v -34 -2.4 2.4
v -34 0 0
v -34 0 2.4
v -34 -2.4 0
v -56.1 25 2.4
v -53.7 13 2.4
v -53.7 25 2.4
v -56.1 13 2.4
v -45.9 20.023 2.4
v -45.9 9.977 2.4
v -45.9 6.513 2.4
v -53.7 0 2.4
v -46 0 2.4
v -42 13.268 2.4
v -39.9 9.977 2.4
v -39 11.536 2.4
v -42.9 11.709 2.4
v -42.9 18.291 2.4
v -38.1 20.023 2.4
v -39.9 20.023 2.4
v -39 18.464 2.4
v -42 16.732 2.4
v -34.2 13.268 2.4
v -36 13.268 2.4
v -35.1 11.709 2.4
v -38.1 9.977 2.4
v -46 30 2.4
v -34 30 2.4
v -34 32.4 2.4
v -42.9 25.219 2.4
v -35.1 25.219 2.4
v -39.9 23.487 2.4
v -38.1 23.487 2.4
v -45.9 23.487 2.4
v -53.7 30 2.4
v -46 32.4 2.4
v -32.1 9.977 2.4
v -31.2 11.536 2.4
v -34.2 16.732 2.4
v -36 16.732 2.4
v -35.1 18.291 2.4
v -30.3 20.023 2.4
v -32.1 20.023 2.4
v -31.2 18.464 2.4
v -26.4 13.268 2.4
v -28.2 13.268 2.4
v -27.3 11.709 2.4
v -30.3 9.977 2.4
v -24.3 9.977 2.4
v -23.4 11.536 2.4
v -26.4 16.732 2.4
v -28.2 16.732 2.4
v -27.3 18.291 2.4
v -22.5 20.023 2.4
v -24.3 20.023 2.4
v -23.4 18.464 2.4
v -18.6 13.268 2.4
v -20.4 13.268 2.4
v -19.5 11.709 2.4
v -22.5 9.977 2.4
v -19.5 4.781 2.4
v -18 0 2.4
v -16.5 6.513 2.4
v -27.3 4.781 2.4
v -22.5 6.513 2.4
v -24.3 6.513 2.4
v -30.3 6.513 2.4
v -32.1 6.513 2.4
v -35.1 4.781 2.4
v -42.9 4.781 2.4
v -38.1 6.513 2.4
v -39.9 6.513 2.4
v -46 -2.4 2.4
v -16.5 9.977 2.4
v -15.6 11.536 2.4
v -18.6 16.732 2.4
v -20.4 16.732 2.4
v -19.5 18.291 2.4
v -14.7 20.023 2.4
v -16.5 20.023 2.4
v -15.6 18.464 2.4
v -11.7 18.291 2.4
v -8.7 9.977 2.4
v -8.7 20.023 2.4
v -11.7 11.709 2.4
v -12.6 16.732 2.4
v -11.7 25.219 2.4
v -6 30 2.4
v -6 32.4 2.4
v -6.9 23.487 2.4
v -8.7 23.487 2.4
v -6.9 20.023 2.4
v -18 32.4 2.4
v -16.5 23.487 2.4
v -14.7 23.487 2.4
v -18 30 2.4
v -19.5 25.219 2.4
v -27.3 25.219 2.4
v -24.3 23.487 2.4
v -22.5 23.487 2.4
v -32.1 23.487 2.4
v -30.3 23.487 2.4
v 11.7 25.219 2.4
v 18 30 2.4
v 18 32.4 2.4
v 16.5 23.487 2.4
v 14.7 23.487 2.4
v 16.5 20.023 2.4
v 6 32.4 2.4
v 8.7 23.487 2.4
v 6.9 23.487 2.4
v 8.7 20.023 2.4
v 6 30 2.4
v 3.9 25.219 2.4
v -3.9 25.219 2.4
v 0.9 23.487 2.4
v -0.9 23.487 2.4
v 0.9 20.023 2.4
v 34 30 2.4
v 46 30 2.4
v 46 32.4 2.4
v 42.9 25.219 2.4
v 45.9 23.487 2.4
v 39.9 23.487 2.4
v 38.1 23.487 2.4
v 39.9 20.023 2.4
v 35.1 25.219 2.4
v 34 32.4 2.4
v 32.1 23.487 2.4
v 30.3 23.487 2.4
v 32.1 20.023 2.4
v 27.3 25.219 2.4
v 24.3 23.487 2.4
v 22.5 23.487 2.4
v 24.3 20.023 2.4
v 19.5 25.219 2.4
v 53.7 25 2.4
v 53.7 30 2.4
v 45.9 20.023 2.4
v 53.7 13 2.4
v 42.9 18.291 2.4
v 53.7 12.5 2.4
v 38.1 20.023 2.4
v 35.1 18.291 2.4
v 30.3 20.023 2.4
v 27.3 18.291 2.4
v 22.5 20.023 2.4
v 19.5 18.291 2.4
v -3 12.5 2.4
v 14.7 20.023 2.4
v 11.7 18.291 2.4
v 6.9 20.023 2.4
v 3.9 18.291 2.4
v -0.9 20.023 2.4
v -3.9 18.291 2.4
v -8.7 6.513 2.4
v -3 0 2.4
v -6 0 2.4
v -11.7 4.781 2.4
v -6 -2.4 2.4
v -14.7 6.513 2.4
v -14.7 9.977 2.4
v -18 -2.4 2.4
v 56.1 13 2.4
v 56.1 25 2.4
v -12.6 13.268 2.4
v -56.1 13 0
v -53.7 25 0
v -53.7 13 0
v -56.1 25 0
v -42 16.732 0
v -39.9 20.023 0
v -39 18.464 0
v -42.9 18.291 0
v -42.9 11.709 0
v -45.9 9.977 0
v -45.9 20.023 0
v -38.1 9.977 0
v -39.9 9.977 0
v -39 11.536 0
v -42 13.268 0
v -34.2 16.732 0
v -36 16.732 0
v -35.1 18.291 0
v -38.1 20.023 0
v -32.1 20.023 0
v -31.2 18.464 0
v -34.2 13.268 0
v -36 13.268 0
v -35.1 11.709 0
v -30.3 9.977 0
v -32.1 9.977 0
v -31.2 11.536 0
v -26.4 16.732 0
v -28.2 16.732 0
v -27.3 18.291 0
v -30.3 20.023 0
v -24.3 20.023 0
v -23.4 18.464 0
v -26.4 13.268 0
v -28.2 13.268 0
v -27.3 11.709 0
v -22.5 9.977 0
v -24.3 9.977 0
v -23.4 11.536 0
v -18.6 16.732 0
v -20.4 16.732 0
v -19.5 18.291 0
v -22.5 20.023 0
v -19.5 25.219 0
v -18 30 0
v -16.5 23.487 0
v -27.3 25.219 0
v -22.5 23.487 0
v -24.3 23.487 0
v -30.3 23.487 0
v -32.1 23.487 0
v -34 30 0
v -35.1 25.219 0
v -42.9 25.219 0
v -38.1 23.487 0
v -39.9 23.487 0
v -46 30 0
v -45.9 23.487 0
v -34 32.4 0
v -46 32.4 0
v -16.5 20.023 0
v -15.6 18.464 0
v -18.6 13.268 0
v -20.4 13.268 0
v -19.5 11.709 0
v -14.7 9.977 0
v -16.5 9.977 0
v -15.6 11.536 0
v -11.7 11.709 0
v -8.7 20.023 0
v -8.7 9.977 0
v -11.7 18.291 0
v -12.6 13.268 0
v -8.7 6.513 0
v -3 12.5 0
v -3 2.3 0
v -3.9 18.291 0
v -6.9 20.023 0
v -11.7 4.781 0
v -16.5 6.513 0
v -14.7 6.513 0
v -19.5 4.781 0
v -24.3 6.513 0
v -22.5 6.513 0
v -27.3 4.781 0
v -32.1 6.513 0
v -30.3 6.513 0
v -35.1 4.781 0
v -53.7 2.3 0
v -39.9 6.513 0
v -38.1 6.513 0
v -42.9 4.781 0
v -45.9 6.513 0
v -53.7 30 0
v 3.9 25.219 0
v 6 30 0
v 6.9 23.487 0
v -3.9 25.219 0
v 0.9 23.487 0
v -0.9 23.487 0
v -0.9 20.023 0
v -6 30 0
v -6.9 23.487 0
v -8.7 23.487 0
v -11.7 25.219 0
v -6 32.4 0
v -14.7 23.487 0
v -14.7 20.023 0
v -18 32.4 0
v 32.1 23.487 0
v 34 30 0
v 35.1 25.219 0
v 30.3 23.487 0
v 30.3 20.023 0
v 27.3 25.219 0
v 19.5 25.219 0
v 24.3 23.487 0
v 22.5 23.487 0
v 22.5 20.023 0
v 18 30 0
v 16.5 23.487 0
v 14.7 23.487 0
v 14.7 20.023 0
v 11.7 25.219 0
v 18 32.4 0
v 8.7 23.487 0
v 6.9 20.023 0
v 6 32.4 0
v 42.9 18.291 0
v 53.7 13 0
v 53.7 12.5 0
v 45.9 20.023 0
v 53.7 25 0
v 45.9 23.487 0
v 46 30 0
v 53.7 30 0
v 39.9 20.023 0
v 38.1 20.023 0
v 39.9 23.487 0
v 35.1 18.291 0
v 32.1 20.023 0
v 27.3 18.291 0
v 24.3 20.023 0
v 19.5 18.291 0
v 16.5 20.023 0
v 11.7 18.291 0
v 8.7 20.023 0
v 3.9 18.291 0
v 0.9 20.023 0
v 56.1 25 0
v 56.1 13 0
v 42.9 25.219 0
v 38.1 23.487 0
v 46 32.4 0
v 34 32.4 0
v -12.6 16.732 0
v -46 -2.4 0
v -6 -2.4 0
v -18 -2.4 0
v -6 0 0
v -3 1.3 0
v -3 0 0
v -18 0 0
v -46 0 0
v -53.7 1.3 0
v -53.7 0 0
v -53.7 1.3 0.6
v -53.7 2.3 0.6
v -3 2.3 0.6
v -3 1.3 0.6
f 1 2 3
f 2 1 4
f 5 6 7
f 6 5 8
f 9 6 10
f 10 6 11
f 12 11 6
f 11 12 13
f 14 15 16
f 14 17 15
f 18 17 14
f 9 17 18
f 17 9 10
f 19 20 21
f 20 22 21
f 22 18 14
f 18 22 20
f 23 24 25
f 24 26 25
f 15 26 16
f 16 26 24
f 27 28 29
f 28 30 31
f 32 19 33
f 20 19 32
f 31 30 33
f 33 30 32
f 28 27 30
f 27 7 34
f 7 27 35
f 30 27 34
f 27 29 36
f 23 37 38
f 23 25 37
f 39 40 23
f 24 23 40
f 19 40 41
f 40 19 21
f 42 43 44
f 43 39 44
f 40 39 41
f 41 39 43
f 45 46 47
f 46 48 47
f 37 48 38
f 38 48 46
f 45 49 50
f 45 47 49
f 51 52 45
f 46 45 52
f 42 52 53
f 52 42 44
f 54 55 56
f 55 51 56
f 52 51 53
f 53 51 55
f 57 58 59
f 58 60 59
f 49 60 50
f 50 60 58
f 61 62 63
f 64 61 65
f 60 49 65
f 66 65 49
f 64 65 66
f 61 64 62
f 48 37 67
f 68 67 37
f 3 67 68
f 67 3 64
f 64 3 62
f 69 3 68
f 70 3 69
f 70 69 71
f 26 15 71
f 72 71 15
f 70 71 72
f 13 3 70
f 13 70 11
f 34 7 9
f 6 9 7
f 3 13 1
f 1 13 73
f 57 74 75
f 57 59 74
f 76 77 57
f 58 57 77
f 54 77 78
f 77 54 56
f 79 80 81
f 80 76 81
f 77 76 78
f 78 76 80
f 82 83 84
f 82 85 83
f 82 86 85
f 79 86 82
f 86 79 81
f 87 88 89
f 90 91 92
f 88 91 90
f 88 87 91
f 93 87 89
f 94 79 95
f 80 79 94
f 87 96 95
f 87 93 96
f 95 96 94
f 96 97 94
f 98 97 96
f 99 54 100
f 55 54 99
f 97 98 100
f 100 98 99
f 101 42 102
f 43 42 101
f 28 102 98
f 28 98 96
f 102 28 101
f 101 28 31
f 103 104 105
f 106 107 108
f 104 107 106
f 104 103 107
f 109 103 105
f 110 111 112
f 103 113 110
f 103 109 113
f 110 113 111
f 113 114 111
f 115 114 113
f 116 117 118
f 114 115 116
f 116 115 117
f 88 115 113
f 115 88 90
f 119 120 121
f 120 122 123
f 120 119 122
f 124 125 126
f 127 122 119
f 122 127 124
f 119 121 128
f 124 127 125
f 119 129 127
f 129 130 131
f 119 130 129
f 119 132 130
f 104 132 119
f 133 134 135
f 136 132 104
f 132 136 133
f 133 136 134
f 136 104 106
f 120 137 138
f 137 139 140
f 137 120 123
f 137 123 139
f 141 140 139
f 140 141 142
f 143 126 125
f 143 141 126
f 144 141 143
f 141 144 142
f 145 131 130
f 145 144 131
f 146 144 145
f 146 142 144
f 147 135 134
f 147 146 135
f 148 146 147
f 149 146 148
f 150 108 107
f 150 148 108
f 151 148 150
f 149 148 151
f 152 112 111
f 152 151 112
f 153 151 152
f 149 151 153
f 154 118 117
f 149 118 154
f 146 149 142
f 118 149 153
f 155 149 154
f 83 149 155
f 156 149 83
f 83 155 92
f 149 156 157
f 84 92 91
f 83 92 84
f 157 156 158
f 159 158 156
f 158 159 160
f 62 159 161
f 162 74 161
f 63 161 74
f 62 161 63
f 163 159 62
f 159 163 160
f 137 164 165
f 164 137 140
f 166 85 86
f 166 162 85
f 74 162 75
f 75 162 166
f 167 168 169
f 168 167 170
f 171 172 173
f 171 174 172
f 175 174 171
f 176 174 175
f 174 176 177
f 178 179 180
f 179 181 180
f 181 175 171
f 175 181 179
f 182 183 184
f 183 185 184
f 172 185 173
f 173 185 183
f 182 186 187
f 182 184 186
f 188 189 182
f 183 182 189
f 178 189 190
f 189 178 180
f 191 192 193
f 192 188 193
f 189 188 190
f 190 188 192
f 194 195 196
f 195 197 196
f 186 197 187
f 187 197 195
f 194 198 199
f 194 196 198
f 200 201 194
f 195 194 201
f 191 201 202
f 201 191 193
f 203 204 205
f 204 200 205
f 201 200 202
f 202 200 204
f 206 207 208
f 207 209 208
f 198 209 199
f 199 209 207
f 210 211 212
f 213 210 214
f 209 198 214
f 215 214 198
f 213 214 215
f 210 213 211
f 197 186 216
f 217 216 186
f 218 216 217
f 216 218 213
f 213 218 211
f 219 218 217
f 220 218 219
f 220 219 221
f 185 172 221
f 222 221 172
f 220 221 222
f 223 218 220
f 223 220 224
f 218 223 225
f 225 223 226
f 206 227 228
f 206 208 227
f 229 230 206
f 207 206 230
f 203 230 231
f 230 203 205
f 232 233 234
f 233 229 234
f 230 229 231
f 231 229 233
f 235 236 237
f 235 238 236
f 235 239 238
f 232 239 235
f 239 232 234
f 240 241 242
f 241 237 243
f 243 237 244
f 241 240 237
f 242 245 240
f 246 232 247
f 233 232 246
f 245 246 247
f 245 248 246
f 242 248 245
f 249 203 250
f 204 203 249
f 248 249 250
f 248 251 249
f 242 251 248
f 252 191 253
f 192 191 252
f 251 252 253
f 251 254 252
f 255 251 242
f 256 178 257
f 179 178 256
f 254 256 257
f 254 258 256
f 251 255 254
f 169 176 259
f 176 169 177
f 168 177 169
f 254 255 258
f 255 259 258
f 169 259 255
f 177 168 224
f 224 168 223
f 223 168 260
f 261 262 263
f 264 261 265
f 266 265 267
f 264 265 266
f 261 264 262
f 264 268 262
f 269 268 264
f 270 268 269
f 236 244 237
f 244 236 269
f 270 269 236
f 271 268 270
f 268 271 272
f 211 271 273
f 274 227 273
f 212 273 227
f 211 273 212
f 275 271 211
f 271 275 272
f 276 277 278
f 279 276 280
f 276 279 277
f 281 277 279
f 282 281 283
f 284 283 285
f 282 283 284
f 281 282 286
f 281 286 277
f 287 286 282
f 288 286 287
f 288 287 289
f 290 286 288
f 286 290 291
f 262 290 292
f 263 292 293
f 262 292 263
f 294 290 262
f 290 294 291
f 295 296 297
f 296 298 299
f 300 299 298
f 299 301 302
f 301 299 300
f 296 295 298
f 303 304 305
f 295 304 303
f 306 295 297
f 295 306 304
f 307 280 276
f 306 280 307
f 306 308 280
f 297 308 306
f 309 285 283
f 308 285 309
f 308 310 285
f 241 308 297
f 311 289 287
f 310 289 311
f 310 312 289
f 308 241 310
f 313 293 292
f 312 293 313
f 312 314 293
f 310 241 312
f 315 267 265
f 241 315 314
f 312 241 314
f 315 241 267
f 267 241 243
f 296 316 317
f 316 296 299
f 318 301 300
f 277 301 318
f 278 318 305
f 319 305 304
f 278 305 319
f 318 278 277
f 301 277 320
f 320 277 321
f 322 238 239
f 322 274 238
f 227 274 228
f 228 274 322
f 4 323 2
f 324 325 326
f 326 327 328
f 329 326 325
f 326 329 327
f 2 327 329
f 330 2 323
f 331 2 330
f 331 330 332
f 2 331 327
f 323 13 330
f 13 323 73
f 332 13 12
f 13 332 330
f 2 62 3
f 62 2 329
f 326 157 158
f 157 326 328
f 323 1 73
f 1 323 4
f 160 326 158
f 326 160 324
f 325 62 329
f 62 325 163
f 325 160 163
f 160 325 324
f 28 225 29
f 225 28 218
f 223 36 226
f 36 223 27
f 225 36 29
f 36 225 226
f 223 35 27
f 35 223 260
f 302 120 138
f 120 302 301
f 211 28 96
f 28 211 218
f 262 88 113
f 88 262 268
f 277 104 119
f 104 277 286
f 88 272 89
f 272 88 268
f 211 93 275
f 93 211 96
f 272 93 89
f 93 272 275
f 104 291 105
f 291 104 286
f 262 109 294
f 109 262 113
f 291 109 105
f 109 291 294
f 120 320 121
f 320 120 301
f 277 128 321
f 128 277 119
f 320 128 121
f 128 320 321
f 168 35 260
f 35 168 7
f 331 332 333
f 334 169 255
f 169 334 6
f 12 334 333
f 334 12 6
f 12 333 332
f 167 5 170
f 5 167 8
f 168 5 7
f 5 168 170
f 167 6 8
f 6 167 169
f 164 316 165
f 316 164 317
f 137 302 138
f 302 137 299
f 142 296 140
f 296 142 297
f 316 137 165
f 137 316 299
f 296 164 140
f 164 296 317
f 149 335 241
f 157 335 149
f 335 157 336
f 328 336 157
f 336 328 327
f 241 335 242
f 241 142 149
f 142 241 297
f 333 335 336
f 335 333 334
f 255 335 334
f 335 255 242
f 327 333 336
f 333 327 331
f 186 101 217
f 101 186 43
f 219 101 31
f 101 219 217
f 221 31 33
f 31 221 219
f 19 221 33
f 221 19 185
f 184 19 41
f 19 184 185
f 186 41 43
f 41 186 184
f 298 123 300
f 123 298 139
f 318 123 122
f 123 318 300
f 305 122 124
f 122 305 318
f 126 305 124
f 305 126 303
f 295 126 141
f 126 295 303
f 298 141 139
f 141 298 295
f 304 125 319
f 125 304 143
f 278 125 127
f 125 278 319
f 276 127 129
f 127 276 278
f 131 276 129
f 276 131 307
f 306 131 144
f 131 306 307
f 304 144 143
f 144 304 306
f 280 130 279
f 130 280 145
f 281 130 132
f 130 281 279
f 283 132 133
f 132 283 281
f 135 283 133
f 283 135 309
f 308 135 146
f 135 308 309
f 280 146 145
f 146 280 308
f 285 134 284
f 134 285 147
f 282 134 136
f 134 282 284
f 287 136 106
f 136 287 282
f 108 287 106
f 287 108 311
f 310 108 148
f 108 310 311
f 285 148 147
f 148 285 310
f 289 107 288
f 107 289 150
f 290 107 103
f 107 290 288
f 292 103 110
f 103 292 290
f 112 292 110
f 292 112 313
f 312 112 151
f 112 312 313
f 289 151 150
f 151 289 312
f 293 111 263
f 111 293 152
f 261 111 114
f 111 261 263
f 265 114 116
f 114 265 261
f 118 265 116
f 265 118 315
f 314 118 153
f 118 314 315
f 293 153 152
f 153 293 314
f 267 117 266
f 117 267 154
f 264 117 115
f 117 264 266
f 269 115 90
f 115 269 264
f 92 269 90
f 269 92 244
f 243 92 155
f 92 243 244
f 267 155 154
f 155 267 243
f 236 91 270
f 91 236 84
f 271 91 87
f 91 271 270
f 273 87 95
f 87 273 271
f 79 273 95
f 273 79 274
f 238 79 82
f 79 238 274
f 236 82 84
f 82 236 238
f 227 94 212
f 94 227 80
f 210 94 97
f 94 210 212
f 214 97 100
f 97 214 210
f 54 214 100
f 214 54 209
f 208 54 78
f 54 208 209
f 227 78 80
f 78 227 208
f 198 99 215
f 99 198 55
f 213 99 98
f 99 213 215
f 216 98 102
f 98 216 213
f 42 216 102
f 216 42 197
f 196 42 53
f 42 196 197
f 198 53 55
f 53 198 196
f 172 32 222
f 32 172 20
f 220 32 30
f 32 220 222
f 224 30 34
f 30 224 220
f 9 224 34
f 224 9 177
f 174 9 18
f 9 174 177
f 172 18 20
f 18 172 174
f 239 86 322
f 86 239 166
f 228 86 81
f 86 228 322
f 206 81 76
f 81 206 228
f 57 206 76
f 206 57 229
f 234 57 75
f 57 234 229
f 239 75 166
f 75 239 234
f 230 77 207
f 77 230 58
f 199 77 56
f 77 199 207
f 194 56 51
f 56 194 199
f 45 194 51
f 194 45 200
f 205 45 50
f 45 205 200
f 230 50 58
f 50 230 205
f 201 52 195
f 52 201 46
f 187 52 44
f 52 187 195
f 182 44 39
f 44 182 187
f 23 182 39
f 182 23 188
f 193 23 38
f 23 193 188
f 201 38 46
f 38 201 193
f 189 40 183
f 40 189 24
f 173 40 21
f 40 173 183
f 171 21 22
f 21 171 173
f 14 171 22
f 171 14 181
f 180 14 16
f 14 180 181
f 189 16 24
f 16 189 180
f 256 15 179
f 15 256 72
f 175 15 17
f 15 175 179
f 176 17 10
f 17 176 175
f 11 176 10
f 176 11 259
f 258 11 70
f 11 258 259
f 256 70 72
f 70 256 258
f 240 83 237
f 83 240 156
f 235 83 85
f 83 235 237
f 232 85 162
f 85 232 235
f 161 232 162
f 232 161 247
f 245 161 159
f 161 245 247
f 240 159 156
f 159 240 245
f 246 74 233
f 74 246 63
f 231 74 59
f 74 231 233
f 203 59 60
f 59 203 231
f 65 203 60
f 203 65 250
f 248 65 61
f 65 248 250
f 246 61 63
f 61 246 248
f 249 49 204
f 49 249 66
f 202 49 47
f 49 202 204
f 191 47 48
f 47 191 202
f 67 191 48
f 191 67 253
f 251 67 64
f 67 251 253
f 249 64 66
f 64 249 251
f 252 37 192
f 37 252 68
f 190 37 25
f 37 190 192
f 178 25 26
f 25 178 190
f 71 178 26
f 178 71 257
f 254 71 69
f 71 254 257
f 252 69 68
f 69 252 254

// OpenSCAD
// file: lib.scad
// Helpers shared by the parts.
include <params.scad>

// box from corner a to corner b
module box(a, b) {
    translate([min(a[0],b[0]), min(a[1],b[1]), min(a[2],b[2])])
        cube([abs(b[0]-a[0]), abs(b[1]-a[1]), abs(b[2]-a[2])]);
}

// ---- pins ---------------------------------------------------------------
// Pin along +z from z=0: cylinder + conical tip.
module pin() {
    cylinder(d = pin_d, h = pin_len - pin_tip + 0.01);
    translate([0, 0, pin_len - pin_tip])
        cylinder(d1 = pin_d, d2 = 1.0, h = pin_tip);
}

// ---- hex bump --------------------------------------------------------
// Hexagonal bump standing on the XY plane, slight taper for a lead-in.
// Same orientation as the honeycomb cells (rotate(30)), so a plate bump
// drops straight into a cell of the plate above.
module hex_bump(af) {
    r = af / sqrt(3);
    translate([0, 0, -0.3])
        linear_extrude(height = bump_h + 0.3, scale = 0.93) rotate(30) circle(r = r, $fn = 6);
}
module hex_hole(af, t) {
    r = af / sqrt(3);
    translate([0, 0, -1]) linear_extrude(height = t + 2) rotate(30) circle(r = r, $fn = 6);
}
// keep-out rectangle for a hex bump (or hole) in a centred 2D field
function bump_keep(x, y, cx, cy, af = wall_bump_af) = let(r = af / sqrt(3) + b_keep_margin)
    [x - r - cx, y - r - cy, x + r - cx, y + r - cy];

// ---- honeycomb -----------------------------------------------------------
// 2D field of hexagonal holes filling a `size` = [w, h] rectangle centred on
// the origin. Only whole cells are emitted, so the border stays a clean web.
// `keep` lists [x0, y0, x1, y1] rectangles (same frame) no cell may touch.
function hits_keep(cx, cy, r, keep) =
    len([for (k = keep) if (cx + r > k[0] && cx - r < k[2] && cy + r > k[1] && cy - r < k[3]) 1]) > 0;

// `phase` shifts the cell grid so two fields on different parts can share
// one lattice (their cells then line up when assembled).
module hex_holes(size, cell, web, keep = [], phase = [0, 0]) {
    r  = cell / sqrt(3);            // circumradius for across-flats = cell
    dx = cell + web;
    dy = dx * sqrt(3) / 2;
    nx = ceil(size[0] / dx) + 1;
    ny = ceil(size[1] / dy) + 1;
    for (j = [-ny - 1 : ny + 1], i = [-nx - 1 : nx + 1]) {
        cx = i * dx + (j % 2 == 0 ? 0 : dx / 2) + phase[0];
        cy = j * dy + phase[1];
        if (abs(cx) + cell/2 <= size[0]/2 && abs(cy) + r <= size[1]/2
            && !hits_keep(cx, cy, r, keep))
            translate([cx, cy]) rotate(30) circle(r = r, $fn = 6);
    }
}

// Through-cut for a wall: hex field extruded `t` thick, centred on z = 0.
module honeycomb_cut(size, t, cell, web, keep = [], phase = [0, 0]) {
    linear_extrude(height = t, center = true) hex_holes(size, cell, web, keep, phase);
}
// file: bay.scad
// Bay: two identical plates, two identical walls and a rear panel, all
// printed flat, joined by tabs through slots (press fit, glue optional).
// Plate bumps drop into the honeycomb cells of the bay above and wall bumps
// into the cells of the bay beside, so bays join with no extra part. The
// rear panel squares the back and leaves the SATA plugs clear.
include <lib.scad>

// slot for a tab of length `l` centred at (x, y), through a flat part
module slot(x, y, l, w, c = tab_clr) translate([x - l/2 - c, y - w/2 - c, -1]) cube([l + 2*c, w + 2*c, 10]);

// ---- plate, own frame: flat, x b_x0..b_l, y centred, z 0..b_t, bumps on +z.
//      The bottom plate is turned over when assembled. The two prints tell
//      themselves apart by their slots: the top carries four rear-panel
//      slots and the two caddy lock slots, the bottom only two rear-panel
//      slots (mirrored, as it is turned over). The rear-panel slots sit at
//      the rear edge, so they also show which way round a plate goes.
module plate(kind = "top") {
    difference() {
        box([b_x0, -b_w/2, 0], [b_l, b_w/2, b_t]);
        for (x = tab_x, s = [-1, 1]) slot(x, s * (b_in_w/2 + b_wall/2), tab_len, b_wall);   // walls
        for (y = rear_slot_y(kind)) slot(rear_x + rear_t/2, y, rear_t, rear_tab, rear_fit_clr);  // rear panel
        // caddy lock slots under both caddy walls, top plate only
        if (kind == "top") for (s = [-1, 1]) box([sp_hole_x[0], s * sp_hole_y[0], -1], [sp_hole_x[1], s * sp_hole_y[1], b_t + 1]);
        translate([b_xc, 0, b_t/2])
            honeycomb_cut([b_l - b_x0 - 2*b_vent_rim, b_in_w - 2*b_vent_rim], b_t + 2, hex_cell, hex_web,
                concat([for (b = plate_bumps) bump_keep(b[0], b[1], b_xc, 0, plate_bump_af)],
                       [for (x = tab_x, s = [-1, 1]) [x - tab_len/2 - b_keep_margin - b_xc, s*b_in_w/2 - 3 - b_keep_margin, x + tab_len/2 + b_keep_margin - b_xc, s*b_in_w/2 + 3 + b_keep_margin]],
                       [for (y = rear_slot_y(kind)) [rear_x - b_keep_margin - b_xc, y - rear_tab/2 - b_keep_margin, rear_x + rear_t + b_keep_margin - b_xc, y + rear_tab/2 + b_keep_margin]],
                       [for (s = [-1, 1]) if (kind == "top") [sp_hole_x[0] - b_keep_margin - b_xc, min(s * sp_hole_y[0], s * sp_hole_y[1]) - b_keep_margin,
                                           sp_hole_x[1] + b_keep_margin - b_xc, max(s * sp_hole_y[0], s * sp_hole_y[1]) + b_keep_margin]]));
    }
    for (b = plate_bumps) translate([b[0], b[1], b_t]) hex_bump(plate_bump_af);
}

// ---- wall, own frame: flat, x b_x0..b_l, y = height 0..b_in_h with tabs
//      beyond, z 0..b_wall, bumps on +z (the outer face when assembled).
module wall() {
    difference() {
        union() {
            box([b_x0, 0, 0], [b_l, b_in_h, b_wall]);
            for (x = tab_x, y0 = [-b_t, b_in_h])
                translate([x - tab_len/2, y0, 0]) cube([tab_len, b_t, b_wall]);
        }
        // rear panel side tab slot, both ends (symmetry), sized to the tab
        for (x = wall_slot_x) slot(x, rear_tab_z, rear_t, rear_tab, rear_fit_clr);
        // orientation groove along the outer face, low down
        translate([b_x0 - 1, groove_z - groove_w/2, b_wall - groove_d]) cube([b_l - b_x0 + 2, groove_w, groove_d + 1]);
        translate([b_xc, b_in_h/2, b_wall/2])
            honeycomb_cut([b_l - b_x0 - 2*w_vent_rim, b_in_h - 2*w_vent_rim], b_wall + 2, w_hex_cell, w_hex_web,
                concat([for (b = wall_bumps) bump_keep(b[0], b[1], b_xc, b_in_h/2, wall_bump_af)],
                       [for (x = wall_slot_x) [x - rear_t/2 - b_keep_margin - b_xc, -50, x + rear_t/2 + b_keep_margin - b_xc, 50]]));
    }
    for (b = wall_bumps) translate([b[0], b[1], b_wall]) hex_bump(wall_bump_af);
}

// ---- rear panel, own frame: flat, x = across the bay (centred), y = height
//      0..b_in_h, tabs beyond all four edges (four into the top plate, two
//      into the bottom plate, one into each wall), z 0..rear_t. The lower +y
//      corner is open for the SATA plugs.
module rear() {
    w = b_in_w - 2*rear_clr;
    difference() {
        union() {
            box([-w/2, 0, 0], [w/2, b_in_h, rear_t]);
            for (y = rear_tab_y_bot) translate([y - rear_tab/2, -b_t, 0]) cube([rear_tab, b_t, rear_t]);     // into the bottom plate
            for (y = rear_tab_y_top) translate([y - rear_tab/2, b_in_h, 0]) cube([rear_tab, b_t, rear_t]);   // into the top plate
            for (s = [-1, 1])                                               // into the walls
                translate([s > 0 ? w/2 : -w/2 - b_wall, rear_tab_z - rear_tab/2, 0]) cube([b_wall, rear_tab, rear_t]);
        }
        // SATA notch: open at the bottom edge and the +y edge
        box([sata_notch_y, -b_t - 1, -1], [w/2 + b_wall + 1, sata_notch_z, rear_t + 1]);
        // orientation groove on the outer face (z = 0 side, which faces the rear when assembled)
        translate([-w/2 - b_wall - 1, groove_z - groove_w/2, -1]) cube([w + 2*b_wall + 2, groove_w, groove_d + 1]);
        // exhaust honeycomb over the rest
        translate([0, b_in_h/2, rear_t/2])
            honeycomb_cut([w - 2*b_vent_rim, b_in_h - 2*w_vent_rim], rear_t + 2, w_hex_cell, w_hex_web,
                [[sata_notch_y - b_keep_margin - 2, -100, 100, sata_notch_z + b_keep_margin + 2 - b_in_h/2]]);
    }
}

// ---- assembled bay in the shared frame -----------------------------------
module plates(top = true) {
    rotate([180, 0, 0]) plate("bottom");                         // bottom, bumps down
    if (top) translate([0, 0, b_in_h]) plate("top");             // top, bumps up
}
module walls() {
    translate([0, -b_in_w/2, 0]) rotate([90, 0, 0]) wall();      // -y wall, bumps out
    translate([b_x0 + b_l, b_in_w/2, 0]) rotate([0, 0, 180]) rotate([90, 0, 0]) wall();  // +y wall, same part turned
}
module rear_placed() translate([rear_x, 0, 0]) rotate([90, 0, 90]) rear();   // panel x -> y, y -> z, z -> x
module bay(top = true) { plates(top); walls(); rear_placed(); }


top = true;   // -D top=false renders the bay without its top plate
bay(top = top);
// main file
// Bay rear panel (print one per bay, flat). SATA cutout at the bottom, tongues
// along the side edges for the wall grooves.
include <params.scad>
use <bay.scad>
rear();
